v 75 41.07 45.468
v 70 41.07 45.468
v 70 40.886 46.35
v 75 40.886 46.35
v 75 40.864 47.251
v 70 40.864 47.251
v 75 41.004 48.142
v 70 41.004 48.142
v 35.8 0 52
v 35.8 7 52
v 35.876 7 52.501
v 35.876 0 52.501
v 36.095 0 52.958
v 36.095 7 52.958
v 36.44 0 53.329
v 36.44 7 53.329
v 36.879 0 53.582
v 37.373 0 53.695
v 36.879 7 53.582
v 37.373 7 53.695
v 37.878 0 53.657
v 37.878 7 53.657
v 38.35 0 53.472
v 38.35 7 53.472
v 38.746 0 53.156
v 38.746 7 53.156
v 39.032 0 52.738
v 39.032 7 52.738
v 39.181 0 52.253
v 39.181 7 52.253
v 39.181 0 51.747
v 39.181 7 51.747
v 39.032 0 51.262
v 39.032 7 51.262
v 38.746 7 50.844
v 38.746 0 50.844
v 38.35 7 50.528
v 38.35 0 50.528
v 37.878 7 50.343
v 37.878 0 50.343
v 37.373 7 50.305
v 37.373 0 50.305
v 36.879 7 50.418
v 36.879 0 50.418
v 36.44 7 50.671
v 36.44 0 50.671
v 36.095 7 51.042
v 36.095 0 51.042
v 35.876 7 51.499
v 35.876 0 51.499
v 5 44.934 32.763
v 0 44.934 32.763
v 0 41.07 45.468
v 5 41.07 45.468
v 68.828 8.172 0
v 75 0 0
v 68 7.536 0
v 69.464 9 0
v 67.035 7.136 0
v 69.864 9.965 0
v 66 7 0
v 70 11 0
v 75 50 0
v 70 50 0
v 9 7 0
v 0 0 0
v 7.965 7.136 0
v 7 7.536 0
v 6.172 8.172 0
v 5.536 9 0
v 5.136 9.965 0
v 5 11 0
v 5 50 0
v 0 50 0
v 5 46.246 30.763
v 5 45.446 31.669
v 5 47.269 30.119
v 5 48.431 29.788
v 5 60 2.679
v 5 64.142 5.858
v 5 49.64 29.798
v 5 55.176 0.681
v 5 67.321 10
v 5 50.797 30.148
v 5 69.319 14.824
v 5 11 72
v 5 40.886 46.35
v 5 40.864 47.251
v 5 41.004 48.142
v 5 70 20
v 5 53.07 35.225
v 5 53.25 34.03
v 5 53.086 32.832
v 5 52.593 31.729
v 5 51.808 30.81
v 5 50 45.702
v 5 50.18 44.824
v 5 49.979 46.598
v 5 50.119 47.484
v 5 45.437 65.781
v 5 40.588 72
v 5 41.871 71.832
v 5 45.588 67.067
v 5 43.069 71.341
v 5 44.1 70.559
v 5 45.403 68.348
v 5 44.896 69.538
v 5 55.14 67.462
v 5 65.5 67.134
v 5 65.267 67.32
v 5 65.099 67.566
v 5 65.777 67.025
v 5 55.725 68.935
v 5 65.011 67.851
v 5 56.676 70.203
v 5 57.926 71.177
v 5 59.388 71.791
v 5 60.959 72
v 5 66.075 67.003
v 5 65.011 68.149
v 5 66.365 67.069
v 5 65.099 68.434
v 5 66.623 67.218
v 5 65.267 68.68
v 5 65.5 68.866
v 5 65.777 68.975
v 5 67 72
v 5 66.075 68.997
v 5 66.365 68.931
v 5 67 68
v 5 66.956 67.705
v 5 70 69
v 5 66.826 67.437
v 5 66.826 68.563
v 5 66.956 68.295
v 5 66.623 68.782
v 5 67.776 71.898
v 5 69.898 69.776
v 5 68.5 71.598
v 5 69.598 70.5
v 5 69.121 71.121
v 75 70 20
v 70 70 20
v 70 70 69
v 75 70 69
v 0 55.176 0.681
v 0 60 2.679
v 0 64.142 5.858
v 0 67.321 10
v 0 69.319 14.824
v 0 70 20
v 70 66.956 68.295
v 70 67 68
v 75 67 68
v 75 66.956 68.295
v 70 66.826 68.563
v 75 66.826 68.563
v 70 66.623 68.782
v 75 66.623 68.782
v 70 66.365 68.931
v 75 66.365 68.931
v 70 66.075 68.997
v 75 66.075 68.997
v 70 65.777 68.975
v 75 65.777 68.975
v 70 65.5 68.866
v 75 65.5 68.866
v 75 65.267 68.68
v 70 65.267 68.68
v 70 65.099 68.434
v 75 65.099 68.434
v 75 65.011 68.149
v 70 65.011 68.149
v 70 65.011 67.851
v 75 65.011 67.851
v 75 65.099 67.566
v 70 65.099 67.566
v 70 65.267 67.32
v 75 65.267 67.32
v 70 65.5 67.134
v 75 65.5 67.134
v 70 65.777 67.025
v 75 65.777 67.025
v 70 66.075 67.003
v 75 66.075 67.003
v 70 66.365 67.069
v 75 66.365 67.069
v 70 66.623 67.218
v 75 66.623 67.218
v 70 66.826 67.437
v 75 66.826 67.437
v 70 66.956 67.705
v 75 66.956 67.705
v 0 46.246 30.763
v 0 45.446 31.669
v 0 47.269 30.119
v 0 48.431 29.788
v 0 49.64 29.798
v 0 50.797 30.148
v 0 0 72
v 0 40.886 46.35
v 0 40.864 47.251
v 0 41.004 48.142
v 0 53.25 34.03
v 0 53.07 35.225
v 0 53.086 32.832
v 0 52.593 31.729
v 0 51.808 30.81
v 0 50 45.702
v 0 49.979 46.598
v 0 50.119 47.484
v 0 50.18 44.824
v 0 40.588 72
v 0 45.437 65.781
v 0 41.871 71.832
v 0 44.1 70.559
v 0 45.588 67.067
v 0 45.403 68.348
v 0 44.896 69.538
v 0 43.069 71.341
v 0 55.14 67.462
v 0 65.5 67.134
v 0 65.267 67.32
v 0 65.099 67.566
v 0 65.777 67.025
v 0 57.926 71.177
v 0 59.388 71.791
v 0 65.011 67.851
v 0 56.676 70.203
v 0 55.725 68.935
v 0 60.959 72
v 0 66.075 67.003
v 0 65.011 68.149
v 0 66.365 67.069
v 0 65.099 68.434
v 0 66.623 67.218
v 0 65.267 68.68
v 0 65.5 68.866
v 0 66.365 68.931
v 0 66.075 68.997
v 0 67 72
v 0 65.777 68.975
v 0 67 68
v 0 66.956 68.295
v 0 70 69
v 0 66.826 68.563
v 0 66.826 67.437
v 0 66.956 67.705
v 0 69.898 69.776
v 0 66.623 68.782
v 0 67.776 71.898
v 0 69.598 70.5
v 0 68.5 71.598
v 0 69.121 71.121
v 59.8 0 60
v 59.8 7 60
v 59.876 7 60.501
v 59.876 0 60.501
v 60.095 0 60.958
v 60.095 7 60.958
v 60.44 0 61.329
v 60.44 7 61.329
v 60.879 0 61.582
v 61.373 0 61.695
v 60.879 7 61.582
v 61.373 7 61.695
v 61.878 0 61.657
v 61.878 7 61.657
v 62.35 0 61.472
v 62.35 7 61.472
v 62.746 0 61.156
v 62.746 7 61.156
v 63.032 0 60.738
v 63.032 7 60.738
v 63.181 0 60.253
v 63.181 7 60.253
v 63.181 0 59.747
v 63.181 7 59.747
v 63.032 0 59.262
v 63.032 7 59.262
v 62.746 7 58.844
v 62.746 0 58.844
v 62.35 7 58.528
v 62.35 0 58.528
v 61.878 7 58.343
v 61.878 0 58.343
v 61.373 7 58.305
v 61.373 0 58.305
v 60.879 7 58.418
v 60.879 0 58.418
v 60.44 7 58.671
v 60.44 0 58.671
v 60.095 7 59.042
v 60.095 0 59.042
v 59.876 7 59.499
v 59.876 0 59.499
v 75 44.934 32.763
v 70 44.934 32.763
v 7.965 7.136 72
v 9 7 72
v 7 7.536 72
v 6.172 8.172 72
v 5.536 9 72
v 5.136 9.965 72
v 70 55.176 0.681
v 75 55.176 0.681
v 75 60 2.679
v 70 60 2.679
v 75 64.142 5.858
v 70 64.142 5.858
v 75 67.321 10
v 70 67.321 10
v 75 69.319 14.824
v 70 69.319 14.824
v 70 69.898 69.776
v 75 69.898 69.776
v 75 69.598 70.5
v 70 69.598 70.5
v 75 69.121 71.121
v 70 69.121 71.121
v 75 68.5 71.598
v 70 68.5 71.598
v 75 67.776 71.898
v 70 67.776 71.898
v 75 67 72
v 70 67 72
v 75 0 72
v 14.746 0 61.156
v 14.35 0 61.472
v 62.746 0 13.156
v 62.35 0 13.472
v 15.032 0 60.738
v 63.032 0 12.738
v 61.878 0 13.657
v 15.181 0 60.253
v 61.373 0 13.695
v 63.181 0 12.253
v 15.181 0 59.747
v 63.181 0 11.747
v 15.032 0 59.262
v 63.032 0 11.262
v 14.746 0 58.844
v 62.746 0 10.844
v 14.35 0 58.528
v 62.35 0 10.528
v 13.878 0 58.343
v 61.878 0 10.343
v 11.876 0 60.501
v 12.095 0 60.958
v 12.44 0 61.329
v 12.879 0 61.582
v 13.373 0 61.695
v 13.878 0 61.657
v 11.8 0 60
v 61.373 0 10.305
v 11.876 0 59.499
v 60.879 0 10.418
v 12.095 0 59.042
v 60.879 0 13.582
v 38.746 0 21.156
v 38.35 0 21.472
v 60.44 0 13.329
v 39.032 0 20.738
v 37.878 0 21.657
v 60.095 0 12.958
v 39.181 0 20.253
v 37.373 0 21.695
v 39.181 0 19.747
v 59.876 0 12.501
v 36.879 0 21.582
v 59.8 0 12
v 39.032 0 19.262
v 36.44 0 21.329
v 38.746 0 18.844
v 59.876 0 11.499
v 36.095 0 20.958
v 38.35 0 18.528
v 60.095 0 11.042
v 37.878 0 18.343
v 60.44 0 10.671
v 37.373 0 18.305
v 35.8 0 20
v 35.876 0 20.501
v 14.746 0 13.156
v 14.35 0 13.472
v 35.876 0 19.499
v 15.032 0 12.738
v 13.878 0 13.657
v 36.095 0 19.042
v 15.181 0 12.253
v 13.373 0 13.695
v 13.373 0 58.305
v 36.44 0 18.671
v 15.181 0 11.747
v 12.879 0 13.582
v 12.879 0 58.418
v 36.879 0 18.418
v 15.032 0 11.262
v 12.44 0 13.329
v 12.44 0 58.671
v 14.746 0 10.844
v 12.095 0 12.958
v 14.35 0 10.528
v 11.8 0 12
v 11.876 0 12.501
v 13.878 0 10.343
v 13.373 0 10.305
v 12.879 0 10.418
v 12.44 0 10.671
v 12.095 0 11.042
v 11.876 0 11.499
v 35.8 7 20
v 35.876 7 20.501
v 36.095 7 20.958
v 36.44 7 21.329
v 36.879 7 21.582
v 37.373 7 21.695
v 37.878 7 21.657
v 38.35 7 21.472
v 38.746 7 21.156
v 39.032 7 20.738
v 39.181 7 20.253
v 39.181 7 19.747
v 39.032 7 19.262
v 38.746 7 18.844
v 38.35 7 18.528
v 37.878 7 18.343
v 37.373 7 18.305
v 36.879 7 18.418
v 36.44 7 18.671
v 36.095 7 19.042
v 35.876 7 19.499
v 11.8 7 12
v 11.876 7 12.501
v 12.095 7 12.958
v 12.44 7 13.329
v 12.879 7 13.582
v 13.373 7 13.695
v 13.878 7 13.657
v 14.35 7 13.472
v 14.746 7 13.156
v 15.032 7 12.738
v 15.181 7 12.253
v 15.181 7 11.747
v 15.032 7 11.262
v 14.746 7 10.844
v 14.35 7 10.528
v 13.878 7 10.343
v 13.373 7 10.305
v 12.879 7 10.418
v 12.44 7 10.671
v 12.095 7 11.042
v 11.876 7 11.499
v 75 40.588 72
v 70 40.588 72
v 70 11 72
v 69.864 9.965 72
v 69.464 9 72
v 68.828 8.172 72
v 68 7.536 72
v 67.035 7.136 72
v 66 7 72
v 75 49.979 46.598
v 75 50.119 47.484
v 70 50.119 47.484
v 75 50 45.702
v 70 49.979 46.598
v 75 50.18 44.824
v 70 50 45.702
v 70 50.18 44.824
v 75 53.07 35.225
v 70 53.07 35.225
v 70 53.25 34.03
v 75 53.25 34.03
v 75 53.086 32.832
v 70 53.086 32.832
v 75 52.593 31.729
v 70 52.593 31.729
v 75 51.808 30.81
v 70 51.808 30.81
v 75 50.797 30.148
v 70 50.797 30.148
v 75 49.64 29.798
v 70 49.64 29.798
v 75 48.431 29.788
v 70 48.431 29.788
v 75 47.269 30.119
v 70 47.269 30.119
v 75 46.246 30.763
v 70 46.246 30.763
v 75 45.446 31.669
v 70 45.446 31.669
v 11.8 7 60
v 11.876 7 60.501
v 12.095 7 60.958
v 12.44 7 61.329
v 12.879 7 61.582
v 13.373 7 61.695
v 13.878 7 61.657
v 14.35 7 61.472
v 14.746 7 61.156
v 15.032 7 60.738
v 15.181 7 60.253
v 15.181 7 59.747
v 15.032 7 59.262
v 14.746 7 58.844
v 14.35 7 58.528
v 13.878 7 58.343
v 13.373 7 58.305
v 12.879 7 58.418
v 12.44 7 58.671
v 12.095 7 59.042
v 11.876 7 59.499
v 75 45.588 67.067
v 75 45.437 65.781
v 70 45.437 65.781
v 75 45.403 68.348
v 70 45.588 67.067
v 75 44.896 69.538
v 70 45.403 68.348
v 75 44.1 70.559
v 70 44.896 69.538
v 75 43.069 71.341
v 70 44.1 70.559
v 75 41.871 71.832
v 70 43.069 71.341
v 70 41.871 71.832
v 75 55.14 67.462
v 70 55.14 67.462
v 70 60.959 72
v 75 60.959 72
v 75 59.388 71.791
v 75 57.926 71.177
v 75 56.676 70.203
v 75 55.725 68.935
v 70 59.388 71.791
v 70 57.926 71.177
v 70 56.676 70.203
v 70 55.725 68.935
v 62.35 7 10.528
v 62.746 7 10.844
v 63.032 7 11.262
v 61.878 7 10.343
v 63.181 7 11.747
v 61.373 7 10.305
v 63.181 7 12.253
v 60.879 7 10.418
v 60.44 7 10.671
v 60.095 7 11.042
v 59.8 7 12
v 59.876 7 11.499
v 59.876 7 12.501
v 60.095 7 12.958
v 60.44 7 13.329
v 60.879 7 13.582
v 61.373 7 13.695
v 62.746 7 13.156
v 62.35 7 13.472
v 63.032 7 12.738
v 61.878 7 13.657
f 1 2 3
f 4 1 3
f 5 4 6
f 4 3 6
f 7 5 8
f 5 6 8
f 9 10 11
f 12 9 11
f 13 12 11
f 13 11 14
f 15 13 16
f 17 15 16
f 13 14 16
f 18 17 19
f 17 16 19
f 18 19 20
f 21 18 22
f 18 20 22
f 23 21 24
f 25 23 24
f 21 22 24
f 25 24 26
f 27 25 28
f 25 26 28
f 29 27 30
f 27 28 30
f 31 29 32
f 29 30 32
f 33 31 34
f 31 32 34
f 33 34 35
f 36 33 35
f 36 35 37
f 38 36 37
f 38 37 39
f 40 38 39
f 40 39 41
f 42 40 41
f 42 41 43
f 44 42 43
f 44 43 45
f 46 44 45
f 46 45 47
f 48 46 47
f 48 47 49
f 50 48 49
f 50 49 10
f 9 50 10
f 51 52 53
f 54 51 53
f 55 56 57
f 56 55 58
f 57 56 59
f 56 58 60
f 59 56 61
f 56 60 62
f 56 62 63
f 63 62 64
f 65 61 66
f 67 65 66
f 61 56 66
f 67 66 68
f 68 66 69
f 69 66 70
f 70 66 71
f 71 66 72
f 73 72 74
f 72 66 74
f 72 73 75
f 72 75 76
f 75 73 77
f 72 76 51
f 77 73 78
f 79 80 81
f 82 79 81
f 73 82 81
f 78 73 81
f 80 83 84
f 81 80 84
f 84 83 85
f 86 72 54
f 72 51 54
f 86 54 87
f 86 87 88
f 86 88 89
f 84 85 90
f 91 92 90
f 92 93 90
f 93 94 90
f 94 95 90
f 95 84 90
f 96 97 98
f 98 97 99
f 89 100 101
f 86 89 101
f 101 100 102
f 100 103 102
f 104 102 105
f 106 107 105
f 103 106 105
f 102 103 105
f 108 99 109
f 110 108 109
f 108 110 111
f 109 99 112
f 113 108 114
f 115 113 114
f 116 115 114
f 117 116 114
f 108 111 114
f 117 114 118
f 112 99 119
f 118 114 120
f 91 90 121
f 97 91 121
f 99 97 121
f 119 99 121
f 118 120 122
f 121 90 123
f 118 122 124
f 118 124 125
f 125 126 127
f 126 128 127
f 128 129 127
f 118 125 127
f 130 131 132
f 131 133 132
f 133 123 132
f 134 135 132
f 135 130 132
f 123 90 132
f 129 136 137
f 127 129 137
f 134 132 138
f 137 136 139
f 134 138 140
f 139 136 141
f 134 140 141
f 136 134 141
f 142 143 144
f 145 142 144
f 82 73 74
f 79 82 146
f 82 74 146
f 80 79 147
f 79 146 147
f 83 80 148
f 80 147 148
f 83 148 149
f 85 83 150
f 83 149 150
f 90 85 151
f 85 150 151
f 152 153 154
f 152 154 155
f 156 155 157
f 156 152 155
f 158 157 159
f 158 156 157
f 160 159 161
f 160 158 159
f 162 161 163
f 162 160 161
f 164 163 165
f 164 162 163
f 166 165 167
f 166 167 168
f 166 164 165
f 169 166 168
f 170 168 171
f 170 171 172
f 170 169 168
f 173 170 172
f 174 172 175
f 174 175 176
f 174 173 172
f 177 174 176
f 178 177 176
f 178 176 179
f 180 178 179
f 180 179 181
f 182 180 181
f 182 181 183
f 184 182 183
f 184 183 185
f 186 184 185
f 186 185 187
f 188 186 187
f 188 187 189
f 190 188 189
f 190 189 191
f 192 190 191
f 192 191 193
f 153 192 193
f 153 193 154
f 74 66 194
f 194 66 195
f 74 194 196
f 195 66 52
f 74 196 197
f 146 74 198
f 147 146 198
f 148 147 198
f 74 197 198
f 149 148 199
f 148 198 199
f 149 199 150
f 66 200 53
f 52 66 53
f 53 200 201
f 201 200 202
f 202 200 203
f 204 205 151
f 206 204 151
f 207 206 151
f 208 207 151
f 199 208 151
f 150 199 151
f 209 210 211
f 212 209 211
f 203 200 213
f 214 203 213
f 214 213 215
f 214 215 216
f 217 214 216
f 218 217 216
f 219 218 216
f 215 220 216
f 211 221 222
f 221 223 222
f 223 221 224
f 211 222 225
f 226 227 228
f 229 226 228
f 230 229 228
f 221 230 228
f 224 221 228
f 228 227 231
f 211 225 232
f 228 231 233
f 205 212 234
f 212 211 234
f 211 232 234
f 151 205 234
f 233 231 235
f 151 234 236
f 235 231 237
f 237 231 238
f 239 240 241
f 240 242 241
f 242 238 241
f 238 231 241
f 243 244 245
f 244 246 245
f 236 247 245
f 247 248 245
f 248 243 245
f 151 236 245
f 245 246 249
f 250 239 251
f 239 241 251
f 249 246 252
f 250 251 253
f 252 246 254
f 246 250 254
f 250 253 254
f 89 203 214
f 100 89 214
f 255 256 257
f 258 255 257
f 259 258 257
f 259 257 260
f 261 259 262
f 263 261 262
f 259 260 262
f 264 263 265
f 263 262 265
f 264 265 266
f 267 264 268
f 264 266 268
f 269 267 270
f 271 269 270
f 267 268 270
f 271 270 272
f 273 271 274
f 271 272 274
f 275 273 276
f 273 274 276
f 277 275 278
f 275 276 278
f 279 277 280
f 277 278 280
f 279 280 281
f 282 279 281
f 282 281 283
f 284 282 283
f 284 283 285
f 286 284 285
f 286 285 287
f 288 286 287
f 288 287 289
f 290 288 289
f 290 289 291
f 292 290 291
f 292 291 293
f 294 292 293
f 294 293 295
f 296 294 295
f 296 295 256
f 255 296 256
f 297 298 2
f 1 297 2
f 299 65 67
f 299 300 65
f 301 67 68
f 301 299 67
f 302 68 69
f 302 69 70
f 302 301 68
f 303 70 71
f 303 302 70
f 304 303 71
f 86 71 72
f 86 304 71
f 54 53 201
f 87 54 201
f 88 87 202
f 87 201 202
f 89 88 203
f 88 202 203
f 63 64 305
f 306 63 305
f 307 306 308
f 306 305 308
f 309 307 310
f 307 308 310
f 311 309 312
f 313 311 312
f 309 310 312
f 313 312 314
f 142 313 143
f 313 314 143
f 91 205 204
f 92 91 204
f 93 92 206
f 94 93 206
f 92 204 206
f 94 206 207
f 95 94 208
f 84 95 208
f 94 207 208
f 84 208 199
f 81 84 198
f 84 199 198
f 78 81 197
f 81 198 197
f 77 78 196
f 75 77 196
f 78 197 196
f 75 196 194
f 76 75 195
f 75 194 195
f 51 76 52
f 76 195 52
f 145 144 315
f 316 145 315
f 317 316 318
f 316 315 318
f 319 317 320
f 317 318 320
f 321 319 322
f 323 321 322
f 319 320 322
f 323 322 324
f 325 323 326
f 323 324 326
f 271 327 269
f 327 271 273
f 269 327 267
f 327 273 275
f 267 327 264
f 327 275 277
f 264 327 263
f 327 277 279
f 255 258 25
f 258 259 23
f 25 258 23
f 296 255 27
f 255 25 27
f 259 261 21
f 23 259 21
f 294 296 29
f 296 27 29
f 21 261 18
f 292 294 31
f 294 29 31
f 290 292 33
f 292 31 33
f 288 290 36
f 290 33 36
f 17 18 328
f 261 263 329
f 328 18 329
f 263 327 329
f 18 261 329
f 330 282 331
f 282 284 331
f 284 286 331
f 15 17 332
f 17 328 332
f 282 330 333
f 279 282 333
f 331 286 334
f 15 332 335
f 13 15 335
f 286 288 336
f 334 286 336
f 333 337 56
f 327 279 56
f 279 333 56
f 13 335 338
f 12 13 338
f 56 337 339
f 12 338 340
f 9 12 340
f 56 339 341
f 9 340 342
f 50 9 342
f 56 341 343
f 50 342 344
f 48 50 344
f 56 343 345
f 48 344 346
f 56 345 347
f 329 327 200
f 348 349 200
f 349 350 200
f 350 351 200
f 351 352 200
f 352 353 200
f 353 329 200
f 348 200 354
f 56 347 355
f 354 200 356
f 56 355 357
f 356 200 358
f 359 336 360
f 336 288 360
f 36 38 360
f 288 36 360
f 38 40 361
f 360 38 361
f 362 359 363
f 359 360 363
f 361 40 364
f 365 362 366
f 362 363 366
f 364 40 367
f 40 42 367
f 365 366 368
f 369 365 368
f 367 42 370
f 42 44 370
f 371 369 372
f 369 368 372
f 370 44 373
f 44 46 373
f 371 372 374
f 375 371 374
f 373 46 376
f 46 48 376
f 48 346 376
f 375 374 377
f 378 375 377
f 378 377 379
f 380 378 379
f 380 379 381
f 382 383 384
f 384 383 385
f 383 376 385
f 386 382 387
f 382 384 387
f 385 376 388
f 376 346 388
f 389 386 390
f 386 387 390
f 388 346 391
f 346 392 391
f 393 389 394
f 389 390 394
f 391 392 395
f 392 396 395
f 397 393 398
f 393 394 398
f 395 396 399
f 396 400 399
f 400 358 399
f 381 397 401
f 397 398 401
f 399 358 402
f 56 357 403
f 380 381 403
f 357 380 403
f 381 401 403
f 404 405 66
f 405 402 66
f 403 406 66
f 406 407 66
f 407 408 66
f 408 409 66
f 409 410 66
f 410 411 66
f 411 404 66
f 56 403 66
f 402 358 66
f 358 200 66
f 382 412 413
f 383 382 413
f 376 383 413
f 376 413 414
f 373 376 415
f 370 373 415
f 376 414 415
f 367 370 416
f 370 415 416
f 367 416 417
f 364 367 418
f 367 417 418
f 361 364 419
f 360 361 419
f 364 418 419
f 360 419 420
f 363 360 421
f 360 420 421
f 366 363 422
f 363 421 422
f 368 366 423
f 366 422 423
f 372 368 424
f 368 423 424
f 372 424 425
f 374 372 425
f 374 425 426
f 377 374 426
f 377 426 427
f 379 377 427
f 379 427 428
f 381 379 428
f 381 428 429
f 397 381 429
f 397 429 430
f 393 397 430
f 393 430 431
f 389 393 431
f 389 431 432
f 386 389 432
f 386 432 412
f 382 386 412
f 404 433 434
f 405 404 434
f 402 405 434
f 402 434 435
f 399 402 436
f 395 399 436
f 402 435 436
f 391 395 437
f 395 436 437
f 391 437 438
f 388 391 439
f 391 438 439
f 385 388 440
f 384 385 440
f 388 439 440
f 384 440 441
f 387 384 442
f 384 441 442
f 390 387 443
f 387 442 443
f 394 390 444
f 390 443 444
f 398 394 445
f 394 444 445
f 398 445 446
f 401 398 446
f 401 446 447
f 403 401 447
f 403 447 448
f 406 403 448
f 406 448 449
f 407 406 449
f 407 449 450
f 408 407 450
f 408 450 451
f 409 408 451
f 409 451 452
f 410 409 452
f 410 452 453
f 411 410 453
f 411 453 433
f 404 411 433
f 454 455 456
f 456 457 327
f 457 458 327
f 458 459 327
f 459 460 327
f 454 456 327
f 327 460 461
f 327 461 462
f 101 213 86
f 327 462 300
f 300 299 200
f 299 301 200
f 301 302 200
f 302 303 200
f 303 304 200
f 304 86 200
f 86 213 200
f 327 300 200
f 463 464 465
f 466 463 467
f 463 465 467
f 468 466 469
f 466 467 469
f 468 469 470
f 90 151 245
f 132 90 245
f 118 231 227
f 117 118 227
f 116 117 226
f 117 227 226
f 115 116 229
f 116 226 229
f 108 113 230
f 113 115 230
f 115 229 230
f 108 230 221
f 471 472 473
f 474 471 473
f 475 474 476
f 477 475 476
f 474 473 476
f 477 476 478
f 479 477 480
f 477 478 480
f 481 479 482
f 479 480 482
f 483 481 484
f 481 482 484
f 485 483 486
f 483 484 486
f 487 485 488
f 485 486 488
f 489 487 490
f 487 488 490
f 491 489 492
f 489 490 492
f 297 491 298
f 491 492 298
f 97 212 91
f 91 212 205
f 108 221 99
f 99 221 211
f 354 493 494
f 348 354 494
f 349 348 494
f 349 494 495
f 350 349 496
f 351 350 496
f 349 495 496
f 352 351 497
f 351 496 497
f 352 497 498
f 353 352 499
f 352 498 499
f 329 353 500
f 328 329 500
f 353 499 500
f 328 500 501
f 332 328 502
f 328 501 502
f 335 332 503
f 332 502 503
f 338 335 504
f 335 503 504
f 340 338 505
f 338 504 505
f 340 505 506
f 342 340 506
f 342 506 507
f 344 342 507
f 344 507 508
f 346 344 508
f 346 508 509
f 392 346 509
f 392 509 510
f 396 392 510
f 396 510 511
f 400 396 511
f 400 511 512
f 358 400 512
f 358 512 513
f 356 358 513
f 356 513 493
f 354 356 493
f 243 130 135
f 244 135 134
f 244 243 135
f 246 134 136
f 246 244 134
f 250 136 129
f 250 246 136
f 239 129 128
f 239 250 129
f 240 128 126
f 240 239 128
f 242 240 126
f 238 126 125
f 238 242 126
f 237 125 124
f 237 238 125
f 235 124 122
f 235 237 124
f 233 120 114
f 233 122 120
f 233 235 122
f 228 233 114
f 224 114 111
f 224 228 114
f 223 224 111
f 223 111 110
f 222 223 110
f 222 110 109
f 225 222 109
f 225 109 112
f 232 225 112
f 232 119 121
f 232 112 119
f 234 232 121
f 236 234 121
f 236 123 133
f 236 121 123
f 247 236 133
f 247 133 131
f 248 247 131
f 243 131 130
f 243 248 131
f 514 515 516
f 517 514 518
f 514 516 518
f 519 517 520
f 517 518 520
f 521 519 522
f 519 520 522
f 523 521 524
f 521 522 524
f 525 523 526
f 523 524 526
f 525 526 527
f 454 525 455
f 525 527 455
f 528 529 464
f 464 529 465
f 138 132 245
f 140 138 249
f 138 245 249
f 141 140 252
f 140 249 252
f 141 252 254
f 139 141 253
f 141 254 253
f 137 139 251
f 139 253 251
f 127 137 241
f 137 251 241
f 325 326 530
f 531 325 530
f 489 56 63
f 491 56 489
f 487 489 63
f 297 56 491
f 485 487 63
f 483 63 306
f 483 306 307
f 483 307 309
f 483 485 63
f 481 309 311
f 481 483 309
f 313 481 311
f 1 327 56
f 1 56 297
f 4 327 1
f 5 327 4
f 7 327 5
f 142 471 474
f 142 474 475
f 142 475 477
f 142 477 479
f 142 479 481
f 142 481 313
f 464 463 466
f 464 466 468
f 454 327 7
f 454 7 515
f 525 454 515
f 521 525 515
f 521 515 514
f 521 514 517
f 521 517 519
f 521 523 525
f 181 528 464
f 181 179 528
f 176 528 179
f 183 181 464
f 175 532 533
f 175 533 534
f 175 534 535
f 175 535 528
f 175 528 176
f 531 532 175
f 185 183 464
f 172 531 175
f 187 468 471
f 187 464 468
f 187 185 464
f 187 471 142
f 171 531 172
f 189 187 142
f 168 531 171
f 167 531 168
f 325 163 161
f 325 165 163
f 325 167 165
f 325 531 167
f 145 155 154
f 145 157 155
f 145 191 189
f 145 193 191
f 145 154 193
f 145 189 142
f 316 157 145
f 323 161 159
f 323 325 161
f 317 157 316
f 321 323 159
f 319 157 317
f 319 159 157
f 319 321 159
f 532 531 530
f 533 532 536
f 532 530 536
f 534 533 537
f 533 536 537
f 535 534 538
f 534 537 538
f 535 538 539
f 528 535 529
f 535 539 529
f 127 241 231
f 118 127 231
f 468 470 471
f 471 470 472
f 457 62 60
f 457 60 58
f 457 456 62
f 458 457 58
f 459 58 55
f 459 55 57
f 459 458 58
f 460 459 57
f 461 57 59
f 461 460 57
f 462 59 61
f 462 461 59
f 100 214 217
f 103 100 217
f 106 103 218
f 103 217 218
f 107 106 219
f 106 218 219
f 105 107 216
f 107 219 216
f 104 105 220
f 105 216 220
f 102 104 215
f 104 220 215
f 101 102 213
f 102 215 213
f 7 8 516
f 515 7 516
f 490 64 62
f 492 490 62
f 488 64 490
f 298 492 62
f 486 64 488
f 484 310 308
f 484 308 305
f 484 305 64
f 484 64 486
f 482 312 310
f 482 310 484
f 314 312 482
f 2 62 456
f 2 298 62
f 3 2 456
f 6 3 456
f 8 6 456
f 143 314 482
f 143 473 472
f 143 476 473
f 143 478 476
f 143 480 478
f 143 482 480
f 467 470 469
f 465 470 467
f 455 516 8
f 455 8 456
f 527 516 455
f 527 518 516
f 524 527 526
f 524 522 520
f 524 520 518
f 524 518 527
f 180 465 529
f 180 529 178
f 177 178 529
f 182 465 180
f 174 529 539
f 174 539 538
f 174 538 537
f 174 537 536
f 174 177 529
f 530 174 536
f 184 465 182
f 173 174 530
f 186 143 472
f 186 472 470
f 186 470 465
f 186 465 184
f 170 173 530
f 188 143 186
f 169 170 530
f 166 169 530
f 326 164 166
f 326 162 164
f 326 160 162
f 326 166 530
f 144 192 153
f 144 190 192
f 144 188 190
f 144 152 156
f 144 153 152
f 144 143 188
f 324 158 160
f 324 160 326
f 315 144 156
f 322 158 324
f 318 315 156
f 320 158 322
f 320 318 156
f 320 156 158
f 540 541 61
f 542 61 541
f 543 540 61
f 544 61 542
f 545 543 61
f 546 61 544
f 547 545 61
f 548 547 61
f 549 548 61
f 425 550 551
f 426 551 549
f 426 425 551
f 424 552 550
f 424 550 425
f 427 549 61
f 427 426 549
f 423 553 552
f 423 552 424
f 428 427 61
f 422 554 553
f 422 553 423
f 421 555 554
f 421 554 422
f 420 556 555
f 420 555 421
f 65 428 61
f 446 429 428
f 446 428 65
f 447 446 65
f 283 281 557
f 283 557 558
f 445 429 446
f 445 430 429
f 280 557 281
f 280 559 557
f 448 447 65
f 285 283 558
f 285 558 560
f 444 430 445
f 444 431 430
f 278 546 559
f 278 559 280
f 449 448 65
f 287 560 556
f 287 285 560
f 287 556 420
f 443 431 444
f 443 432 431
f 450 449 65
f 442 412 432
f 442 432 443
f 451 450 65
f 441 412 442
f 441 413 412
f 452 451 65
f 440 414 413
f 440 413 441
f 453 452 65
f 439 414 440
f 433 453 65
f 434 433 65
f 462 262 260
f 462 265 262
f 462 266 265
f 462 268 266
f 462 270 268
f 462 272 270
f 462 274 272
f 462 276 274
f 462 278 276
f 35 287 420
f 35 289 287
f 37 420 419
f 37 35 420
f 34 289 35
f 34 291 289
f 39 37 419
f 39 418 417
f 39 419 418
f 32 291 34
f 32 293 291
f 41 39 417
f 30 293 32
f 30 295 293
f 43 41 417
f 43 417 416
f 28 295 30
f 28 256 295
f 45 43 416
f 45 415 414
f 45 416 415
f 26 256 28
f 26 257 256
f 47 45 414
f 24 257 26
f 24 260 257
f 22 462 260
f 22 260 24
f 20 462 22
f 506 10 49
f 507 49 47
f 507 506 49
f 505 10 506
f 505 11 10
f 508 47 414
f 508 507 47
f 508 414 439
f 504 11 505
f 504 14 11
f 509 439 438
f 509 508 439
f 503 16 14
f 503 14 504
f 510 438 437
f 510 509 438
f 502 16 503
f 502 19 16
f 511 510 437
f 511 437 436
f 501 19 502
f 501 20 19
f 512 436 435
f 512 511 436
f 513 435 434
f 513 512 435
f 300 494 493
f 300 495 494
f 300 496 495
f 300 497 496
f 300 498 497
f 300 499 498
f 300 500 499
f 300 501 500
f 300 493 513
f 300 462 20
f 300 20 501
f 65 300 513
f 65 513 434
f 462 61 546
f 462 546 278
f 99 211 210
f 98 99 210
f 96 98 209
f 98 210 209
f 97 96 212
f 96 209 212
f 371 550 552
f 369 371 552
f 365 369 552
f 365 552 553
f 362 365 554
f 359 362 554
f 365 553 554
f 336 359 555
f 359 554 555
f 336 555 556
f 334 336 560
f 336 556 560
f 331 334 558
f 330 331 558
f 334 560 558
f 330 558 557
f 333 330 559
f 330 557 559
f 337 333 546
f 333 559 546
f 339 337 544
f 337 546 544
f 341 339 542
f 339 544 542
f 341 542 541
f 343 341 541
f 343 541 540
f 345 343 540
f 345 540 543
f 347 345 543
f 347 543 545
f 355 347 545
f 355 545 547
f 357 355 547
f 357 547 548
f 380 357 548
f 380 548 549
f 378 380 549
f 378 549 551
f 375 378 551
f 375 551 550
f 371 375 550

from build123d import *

# Parameters (mm, degrees)
F0_R     = 1
F1_DEPTH = 75
F2_W     = 65
F2_H     = 95
F3_DEPTH = 63
F4_R     = 1.7
F5_DEPTH = 7.001
F6_R     = 4


with BuildPart() as f1:
    # F0 (on Right) → F1 (new body)
    with BuildSketch(Plane.YZ):
        with BuildLine():
            Line((0, 72), (0, 0))
            Line((0, 0), (50, 0))
            ThreePointArc((50, 0), (64.142136, 5.857864), (70, 20))
            Line((70, 20), (70, 69))
            ThreePointArc((70, 69), (69.12132, 71.12132), (67, 72))
            Line((67, 72), (60.95857, 72))
            ThreePointArc((60.95857, 72), (57.269006, 70.731503), (55.139509, 67.462372))
            Line((55.139509, 67.462372), (50.118783, 47.483938))
            ThreePointArc((50.118783, 47.483938), (49.969332, 46.149869), (50.180201, 44.824121))
            Line((50.180201, 44.824121), (53.069629, 35.224997))
            ThreePointArc((53.069629, 35.224997), (50.230854, 29.932138), (44.933914, 32.763293))
            Line((44.933914, 32.763293), (41.069777, 45.467928))
            ThreePointArc((41.069777, 45.467928), (40.854911, 46.800259), (41.00419, 48.141522))
            Line((41.00419, 48.141522), (45.437209, 65.781356))
            ThreePointArc((45.437209, 65.781356), (44.530911, 70.074637), (40.587992, 72))
            Line((40.587992, 72), (0, 72))
        make_face()
        with Locations((66, 68)):
            Circle(F0_R, mode=Mode.SUBTRACT)
    extrude(amount=F1_DEPTH)

    # F2 (on face) → F3 (cut)
    with BuildSketch(Plane(origin=(0, 70, 0), x_dir=(-1, 0, 0), z_dir=(0, 1, 0))):
        with Locations((-37.5, 41.631669)):
            Rectangle(F2_W, F2_H)
    extrude(amount=-F3_DEPTH, mode=Mode.SUBTRACT)

    # F4 (on face) → F5 (cut, through all)
    with BuildSketch(Plane(origin=(0, 7, 0), x_dir=(-1, 0, 0), z_dir=(0, 1, 0))):
        with Locations((-61.5, 60)):
            Circle(F4_R)
        with Locations((-61.5, 12)):
            Circle(F4_R)
        with Locations((-13.5, 12)):
            Circle(F4_R)
        with Locations((-13.5, 60)):
            Circle(F4_R)
        with Locations((-37.5, 52)):
            Circle(F4_R)
        with Locations((-37.5, 20)):
            Circle(F4_R)
    extrude(amount=-F5_DEPTH, mode=Mode.SUBTRACT)

    # F6
    f6_edges = [f1.edges().sort_by_distance(p)[0] for p in [
        (70, 7, 36),
        (5, 7, 36),
    ]]
    fillet(f6_edges, radius=F6_R)


solid = f1.part
